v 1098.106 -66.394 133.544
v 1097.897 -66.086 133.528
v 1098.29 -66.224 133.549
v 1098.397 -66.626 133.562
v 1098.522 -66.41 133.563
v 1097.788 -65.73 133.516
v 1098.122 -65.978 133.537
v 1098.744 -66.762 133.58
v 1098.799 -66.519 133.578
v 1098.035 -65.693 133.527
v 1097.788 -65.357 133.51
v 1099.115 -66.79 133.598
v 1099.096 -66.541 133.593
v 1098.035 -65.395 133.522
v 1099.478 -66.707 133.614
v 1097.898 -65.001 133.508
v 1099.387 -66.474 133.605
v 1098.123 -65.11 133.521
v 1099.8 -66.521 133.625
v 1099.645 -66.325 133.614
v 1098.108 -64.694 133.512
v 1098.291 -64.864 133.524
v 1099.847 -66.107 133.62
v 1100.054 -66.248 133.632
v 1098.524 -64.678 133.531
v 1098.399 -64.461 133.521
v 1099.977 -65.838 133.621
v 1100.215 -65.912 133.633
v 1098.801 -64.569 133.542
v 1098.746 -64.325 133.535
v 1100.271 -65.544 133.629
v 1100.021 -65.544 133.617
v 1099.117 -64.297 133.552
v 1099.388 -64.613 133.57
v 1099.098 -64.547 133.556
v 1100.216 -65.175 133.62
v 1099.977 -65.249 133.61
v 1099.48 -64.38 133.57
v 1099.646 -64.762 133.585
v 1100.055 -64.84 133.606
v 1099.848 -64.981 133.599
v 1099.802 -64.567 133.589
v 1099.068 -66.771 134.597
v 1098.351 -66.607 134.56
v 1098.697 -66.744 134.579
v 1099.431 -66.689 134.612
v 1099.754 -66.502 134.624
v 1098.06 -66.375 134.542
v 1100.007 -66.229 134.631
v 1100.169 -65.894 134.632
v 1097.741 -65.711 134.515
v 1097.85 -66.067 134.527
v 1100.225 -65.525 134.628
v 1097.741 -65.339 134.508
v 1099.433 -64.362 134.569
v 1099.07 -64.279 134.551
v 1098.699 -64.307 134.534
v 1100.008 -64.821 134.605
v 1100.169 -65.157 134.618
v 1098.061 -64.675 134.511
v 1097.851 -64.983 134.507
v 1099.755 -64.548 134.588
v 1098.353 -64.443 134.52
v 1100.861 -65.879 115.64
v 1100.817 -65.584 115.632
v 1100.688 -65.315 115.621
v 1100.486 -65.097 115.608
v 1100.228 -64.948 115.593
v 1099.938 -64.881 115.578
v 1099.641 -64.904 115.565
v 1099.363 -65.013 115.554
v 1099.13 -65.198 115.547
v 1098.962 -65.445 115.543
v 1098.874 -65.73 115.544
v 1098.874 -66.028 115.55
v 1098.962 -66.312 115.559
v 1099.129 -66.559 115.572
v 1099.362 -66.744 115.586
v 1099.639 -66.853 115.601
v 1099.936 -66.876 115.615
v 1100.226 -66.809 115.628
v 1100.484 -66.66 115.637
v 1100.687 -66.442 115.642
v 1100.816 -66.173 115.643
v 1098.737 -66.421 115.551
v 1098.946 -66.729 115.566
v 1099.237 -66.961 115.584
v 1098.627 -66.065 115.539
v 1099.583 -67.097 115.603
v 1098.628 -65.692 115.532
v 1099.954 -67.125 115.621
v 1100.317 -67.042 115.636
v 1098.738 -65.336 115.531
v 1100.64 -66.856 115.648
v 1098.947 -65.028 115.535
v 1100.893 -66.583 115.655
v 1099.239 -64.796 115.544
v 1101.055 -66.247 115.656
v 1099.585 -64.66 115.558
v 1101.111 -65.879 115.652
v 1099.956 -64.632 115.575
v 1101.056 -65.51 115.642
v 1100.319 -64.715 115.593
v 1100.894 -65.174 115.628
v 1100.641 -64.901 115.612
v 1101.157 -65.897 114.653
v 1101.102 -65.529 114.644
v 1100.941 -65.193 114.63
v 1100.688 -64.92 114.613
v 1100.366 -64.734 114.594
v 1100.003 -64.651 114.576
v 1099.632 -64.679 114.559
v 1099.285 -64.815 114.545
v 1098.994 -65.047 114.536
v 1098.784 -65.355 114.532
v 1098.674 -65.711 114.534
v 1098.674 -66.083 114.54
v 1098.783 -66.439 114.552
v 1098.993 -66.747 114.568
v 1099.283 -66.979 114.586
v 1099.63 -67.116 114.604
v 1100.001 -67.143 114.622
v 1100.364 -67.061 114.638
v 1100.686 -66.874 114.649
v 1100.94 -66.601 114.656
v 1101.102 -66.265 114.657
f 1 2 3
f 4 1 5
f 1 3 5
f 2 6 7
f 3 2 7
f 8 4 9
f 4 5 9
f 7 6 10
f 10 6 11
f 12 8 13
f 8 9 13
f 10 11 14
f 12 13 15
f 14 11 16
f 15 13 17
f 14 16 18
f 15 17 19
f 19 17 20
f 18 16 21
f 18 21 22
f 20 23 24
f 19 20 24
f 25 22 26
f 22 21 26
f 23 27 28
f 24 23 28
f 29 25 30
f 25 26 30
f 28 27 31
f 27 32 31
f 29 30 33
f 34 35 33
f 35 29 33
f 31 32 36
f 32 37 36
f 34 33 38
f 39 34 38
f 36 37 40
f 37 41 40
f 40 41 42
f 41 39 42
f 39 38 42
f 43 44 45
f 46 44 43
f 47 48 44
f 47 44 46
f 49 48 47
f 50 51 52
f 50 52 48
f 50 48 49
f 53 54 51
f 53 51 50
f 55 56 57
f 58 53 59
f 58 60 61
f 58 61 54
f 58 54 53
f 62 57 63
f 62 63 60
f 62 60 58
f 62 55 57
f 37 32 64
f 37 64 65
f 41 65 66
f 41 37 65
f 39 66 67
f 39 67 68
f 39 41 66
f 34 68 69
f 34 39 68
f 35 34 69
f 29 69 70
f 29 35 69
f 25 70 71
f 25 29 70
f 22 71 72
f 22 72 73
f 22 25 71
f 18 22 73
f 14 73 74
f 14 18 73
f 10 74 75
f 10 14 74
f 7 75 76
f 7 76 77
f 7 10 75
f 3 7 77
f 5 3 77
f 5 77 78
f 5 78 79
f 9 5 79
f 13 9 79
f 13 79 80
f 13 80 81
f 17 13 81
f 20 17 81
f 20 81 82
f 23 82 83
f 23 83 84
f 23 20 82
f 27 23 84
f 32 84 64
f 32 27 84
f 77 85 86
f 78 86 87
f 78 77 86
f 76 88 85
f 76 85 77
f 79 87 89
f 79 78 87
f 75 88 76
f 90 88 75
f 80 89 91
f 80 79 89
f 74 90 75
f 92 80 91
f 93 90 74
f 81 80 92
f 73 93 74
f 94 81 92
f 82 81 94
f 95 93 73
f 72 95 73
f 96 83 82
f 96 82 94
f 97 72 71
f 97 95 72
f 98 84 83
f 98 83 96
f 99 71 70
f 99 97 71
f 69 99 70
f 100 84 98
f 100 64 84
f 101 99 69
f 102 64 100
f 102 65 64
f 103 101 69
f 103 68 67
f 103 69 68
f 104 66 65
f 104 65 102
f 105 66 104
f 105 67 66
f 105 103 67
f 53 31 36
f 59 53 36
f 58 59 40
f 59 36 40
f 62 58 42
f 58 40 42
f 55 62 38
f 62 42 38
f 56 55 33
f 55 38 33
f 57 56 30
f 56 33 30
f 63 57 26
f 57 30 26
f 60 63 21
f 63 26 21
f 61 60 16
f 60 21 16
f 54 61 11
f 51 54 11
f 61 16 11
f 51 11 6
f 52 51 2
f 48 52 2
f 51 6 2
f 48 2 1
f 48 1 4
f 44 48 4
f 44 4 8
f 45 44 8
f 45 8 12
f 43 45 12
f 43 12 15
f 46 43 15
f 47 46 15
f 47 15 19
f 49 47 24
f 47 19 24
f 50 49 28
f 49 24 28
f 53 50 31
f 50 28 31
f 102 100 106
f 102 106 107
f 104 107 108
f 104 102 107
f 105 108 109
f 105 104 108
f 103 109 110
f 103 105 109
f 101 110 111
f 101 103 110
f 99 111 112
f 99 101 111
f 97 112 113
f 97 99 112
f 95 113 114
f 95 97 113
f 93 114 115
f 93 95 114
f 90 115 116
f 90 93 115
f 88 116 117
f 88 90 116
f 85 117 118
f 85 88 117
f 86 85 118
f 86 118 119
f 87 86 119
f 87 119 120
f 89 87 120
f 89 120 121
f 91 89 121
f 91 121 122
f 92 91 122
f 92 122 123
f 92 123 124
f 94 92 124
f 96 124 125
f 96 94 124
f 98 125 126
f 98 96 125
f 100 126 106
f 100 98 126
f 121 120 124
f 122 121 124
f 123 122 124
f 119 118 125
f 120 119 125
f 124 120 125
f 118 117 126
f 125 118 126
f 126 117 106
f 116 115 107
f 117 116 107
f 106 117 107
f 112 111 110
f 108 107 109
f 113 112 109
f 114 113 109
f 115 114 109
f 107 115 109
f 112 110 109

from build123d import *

# Parameters (mm, degrees)
SKETCH1_R           = 1
BOSS_EXTRUDE1_DEPTH = 18
SKETCH2_R           = 1.25
BOSS_EXTRUDE2_DEPTH = 1


with BuildPart() as part:
    # Sketch1 → Boss-Extrude1 (new body)
    with BuildSketch(Plane(origin=(-3.774347483, 1.505086334, 80.82202498), x_dir=(0.9989117358115743, 0.0008684011141373105, 0.04663249872580849), z_dir=(-0.04664058380753361, 0.018598739412937847, 0.9987385758216923))):
        with Locations(Location((1103.998324858, -68.019334286, 0), (0, 0, 359.950235667))):
            Circle(SKETCH1_R)
    extrude(amount=-BOSS_EXTRUDE1_DEPTH)

    # Sketch2 → Boss-Extrude2 (add)
    with BuildSketch(Plane(origin=(-3.774347483, 1.505086334, 80.82202498), x_dir=(0.9989117358115743, 0.0008684011141373106, 0.046632498725808505), z_dir=(-0.04664058380753362, 0.01859873941293785, 0.9987385758216923))):
        with Locations(Location((1103.998324858, -68.019334286, 0), (0, 0, 359.950235667))):
            Circle(SKETCH2_R)
    boss_extrude2 = extrude(amount=BOSS_EXTRUDE2_DEPTH)

    # Mirror1: Boss-Extrude2 across plane
    add(boss_extrude2.mirror(Plane(origin=(-3.354582228, 1.337697679, 71.833377798), x_dir=(0.9989117358115743, 0.000868401114137311, 0.04663249872580852), z_dir=(-0.04664058380753362, 0.01859873941293785, 0.9987385758216923))))


solid = part.part
